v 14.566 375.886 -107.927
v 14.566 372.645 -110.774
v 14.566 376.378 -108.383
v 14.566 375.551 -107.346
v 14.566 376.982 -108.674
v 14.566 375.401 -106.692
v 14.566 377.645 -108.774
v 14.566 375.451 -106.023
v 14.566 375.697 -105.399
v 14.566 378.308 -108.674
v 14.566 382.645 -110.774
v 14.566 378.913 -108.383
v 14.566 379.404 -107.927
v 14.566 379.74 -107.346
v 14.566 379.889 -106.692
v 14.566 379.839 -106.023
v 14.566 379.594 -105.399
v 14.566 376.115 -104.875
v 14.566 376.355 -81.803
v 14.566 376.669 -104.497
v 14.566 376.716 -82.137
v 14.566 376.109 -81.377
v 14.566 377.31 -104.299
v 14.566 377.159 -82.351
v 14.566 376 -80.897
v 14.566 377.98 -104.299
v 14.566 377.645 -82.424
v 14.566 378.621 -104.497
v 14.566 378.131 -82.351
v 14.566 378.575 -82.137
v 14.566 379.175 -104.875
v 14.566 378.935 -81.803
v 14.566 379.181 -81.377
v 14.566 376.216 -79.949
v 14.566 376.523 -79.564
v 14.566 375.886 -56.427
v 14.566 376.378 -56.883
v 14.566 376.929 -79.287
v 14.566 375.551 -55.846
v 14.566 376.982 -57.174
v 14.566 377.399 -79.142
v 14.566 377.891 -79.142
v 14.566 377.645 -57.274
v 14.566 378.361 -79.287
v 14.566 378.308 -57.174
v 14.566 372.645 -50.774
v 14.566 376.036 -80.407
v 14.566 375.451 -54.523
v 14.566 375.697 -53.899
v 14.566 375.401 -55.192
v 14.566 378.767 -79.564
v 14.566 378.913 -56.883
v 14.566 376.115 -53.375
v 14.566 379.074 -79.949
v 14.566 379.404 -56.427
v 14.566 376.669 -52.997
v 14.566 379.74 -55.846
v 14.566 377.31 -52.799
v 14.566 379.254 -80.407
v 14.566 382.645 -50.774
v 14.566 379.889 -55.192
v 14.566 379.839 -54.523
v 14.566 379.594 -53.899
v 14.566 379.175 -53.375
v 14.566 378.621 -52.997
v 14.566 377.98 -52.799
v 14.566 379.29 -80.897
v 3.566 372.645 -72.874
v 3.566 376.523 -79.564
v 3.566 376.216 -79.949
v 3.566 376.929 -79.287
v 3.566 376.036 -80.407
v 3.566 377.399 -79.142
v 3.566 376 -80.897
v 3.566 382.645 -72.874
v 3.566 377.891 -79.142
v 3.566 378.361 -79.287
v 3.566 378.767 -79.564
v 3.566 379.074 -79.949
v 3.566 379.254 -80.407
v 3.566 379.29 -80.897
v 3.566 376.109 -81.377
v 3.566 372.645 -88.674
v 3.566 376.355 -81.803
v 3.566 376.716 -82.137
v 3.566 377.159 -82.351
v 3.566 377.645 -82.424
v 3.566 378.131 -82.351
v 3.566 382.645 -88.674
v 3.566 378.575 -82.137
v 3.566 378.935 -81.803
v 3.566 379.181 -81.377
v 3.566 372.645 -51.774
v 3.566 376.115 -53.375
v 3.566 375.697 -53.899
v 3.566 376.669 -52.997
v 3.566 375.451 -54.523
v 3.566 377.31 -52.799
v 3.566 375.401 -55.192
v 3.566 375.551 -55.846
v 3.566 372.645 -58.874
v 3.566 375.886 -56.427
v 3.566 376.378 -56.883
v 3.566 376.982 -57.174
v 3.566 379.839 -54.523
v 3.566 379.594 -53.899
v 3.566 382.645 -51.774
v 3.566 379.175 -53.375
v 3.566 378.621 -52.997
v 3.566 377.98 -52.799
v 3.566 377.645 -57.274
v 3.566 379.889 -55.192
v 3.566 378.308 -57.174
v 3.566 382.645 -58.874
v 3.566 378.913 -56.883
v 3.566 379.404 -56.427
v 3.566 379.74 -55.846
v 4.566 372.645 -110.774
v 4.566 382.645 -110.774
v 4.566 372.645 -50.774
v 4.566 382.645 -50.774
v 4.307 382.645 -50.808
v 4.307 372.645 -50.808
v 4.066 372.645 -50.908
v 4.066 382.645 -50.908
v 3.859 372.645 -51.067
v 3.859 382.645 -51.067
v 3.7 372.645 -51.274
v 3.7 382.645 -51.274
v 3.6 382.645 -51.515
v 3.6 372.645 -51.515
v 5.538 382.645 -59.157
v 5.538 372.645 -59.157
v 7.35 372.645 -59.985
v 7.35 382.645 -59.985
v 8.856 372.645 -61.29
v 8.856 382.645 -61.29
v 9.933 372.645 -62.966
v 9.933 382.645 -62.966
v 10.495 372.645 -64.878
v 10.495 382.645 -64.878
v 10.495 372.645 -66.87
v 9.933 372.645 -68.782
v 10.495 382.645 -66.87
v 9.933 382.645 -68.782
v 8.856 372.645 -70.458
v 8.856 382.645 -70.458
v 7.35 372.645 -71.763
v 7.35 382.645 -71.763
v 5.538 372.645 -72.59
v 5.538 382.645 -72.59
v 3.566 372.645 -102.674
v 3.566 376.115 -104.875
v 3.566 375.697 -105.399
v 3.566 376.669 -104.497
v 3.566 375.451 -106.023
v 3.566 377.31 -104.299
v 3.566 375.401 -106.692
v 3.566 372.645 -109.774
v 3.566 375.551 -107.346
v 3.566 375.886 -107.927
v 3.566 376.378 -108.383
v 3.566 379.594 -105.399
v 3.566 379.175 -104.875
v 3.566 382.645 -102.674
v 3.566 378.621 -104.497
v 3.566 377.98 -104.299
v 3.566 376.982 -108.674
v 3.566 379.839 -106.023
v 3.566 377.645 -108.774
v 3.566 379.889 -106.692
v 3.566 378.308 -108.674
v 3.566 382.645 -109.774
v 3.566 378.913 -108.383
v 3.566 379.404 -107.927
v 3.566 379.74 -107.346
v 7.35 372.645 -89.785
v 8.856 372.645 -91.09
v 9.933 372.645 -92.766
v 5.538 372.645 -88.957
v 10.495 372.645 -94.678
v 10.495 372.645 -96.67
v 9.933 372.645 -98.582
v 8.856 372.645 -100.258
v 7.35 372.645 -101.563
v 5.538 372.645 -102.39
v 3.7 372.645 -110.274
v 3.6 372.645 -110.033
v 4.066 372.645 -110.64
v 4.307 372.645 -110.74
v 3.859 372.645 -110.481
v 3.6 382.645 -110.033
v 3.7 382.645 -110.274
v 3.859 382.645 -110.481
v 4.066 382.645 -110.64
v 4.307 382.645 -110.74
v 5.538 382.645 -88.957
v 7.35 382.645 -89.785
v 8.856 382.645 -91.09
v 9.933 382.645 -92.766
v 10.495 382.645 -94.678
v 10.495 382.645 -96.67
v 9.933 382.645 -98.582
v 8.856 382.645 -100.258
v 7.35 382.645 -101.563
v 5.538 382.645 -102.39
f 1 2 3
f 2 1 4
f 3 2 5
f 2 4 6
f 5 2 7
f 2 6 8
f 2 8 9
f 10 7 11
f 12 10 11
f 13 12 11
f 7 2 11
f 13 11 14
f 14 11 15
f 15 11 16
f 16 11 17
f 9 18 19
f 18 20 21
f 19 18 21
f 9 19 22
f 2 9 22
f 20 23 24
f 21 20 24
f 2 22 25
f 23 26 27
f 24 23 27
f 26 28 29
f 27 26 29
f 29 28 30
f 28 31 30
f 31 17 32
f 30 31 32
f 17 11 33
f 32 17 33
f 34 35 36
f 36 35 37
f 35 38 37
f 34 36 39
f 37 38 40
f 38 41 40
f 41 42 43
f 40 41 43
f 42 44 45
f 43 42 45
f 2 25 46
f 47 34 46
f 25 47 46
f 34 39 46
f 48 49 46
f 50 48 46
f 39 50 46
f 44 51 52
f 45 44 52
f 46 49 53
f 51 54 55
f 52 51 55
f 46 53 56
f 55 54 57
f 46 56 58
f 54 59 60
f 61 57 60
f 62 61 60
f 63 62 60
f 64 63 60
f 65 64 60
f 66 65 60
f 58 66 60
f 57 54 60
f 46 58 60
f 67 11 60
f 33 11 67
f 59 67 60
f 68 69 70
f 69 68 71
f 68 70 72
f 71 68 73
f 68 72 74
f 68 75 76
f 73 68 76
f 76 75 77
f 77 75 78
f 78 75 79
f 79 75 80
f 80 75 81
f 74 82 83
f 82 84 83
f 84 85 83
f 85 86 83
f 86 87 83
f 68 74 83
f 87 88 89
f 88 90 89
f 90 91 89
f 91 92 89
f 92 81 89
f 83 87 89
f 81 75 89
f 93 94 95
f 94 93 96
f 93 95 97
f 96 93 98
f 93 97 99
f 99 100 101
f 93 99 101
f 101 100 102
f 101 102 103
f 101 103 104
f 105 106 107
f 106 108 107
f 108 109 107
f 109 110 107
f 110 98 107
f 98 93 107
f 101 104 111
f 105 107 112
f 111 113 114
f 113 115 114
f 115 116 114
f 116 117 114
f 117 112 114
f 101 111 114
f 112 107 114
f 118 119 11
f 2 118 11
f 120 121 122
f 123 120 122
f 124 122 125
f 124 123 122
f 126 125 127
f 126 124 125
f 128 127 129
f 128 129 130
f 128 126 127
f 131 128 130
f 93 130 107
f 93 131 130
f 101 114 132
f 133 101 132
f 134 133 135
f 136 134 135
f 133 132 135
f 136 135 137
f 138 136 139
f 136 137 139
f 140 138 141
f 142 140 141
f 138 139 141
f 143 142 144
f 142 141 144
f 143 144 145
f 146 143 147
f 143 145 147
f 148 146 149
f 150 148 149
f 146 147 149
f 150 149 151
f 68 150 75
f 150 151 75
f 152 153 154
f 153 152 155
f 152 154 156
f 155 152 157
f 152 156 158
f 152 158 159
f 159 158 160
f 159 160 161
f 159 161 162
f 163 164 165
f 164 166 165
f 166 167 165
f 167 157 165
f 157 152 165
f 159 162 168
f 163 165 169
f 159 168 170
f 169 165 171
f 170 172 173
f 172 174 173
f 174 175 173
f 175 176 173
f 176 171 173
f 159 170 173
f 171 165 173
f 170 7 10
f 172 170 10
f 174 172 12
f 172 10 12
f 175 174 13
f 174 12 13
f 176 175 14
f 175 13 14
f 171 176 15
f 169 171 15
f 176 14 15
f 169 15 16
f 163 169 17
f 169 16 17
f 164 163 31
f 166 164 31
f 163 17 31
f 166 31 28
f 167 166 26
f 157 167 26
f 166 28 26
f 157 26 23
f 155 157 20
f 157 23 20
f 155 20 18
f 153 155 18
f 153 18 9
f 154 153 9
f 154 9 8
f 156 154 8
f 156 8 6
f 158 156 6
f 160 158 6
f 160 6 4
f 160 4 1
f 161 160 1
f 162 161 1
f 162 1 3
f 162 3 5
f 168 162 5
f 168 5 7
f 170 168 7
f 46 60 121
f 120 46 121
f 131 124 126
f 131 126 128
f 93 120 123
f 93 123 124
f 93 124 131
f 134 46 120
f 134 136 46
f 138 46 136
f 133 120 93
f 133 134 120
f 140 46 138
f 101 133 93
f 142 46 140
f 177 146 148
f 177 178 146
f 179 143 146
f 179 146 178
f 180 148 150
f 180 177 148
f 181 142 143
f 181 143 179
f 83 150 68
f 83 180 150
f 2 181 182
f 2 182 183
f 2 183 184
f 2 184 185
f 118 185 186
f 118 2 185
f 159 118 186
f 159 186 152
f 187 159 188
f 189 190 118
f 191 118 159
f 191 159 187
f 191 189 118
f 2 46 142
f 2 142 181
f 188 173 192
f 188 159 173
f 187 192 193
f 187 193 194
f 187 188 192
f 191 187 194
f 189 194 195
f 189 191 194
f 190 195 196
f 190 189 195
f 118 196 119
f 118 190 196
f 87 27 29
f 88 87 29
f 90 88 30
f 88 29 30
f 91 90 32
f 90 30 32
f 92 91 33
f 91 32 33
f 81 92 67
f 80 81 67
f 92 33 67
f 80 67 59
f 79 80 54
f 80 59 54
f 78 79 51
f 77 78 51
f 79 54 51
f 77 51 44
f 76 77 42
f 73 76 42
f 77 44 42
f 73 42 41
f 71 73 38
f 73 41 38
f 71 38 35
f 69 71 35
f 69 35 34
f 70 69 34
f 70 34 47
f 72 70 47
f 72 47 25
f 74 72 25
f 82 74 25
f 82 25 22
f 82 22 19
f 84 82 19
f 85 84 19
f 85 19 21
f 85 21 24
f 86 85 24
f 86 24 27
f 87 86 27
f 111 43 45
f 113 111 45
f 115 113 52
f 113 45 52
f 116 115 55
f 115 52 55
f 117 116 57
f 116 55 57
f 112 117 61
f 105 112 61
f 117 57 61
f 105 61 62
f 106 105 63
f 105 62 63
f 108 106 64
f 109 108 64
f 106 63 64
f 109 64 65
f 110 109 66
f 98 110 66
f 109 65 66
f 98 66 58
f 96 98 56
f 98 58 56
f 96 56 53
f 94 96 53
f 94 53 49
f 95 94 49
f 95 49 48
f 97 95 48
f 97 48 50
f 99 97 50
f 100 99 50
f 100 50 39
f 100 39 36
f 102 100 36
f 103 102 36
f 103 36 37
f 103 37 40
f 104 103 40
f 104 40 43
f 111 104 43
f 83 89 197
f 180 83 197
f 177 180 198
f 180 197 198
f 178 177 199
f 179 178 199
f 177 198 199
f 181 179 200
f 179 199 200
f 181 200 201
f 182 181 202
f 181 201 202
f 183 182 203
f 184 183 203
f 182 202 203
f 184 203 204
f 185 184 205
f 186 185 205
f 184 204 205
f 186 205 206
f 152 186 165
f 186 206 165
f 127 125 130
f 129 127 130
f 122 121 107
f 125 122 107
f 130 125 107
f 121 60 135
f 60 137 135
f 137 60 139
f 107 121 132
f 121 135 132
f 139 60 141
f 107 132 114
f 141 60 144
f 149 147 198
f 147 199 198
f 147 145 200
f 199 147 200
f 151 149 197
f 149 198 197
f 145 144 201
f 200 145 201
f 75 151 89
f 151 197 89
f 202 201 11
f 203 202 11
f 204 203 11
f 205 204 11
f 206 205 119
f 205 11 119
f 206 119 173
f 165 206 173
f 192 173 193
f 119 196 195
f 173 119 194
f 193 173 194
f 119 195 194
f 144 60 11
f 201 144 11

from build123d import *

# Parameters (mm, degrees)
EXTRUDE_1_DEPTH   = 10
FILLET_1_R        = 1
HOLE_WIZARD_M41_D = 4.5
M4X0_71_D         = 3.3


with BuildPart() as part:
    # Эскиз2 → Бобышка-Вытянуть1 (new body)
    with BuildSketch(Plane(origin=(0, 382.645061039, 0), x_dir=(1, 0, 0), z_dir=(0, 1, 0))):
        with BuildLine():
            Line((3.565848943, 102.673881836), (3.565848943, 110.773881836))
            Line((3.565848943, 110.773881836), (14.565848943, 110.773881836))
            Line((14.565848943, 110.773881836), (14.565848943, 50.773881836))
            Line((14.565848943, 50.773881836), (3.565848943, 50.773881836))
            Line((3.565848943, 50.773881836), (3.565848943, 58.873881836))
            ThreePointArc((3.565848943, 58.873881836), (10.565848943, 65.873881836), (3.565848943, 72.873881836))
            Line((3.565848943, 72.873881836), (3.565848943, 88.673881836))
            ThreePointArc((3.565848943, 88.673881836), (10.565848943, 95.673881836), (3.565848943, 102.673881836))
        make_face()
    extrude(amount=-EXTRUDE_1_DEPTH)

    # Скругление1
    fillet_1_edges = [part.edges().sort_by_distance(p)[0] for p in [
        (3.565848943, 377.645061039, -50.773881836),
        (3.565848943, 377.645061039, -110.773881836),
    ]]
    fillet(fillet_1_edges, radius=FILLET_1_R)

    # Отверстие с зазором M41 (through all)
    with Locations(Plane(origin=(3.565848943, 346.946860721, -25.652823237), x_dir=(0, 0, 1), z_dir=(-1, 0, 0))):
        with Locations((-80.8710586, 30.698200318), (-29.3710586, 30.698200318)):
            Hole(HOLE_WIZARD_M41_D / 2)

    # Отверстие обработанное метчиком M4x0.71 (through all)
    with Locations(Plane(origin=(3.565848943, 346.946860721, -25.652823237), x_dir=(0, 0, 1), z_dir=(-1, 0, 0))):
        with Locations((-55.1210586, 30.698200318)):
            Hole(M4X0_71_D / 2)


solid = part.part
